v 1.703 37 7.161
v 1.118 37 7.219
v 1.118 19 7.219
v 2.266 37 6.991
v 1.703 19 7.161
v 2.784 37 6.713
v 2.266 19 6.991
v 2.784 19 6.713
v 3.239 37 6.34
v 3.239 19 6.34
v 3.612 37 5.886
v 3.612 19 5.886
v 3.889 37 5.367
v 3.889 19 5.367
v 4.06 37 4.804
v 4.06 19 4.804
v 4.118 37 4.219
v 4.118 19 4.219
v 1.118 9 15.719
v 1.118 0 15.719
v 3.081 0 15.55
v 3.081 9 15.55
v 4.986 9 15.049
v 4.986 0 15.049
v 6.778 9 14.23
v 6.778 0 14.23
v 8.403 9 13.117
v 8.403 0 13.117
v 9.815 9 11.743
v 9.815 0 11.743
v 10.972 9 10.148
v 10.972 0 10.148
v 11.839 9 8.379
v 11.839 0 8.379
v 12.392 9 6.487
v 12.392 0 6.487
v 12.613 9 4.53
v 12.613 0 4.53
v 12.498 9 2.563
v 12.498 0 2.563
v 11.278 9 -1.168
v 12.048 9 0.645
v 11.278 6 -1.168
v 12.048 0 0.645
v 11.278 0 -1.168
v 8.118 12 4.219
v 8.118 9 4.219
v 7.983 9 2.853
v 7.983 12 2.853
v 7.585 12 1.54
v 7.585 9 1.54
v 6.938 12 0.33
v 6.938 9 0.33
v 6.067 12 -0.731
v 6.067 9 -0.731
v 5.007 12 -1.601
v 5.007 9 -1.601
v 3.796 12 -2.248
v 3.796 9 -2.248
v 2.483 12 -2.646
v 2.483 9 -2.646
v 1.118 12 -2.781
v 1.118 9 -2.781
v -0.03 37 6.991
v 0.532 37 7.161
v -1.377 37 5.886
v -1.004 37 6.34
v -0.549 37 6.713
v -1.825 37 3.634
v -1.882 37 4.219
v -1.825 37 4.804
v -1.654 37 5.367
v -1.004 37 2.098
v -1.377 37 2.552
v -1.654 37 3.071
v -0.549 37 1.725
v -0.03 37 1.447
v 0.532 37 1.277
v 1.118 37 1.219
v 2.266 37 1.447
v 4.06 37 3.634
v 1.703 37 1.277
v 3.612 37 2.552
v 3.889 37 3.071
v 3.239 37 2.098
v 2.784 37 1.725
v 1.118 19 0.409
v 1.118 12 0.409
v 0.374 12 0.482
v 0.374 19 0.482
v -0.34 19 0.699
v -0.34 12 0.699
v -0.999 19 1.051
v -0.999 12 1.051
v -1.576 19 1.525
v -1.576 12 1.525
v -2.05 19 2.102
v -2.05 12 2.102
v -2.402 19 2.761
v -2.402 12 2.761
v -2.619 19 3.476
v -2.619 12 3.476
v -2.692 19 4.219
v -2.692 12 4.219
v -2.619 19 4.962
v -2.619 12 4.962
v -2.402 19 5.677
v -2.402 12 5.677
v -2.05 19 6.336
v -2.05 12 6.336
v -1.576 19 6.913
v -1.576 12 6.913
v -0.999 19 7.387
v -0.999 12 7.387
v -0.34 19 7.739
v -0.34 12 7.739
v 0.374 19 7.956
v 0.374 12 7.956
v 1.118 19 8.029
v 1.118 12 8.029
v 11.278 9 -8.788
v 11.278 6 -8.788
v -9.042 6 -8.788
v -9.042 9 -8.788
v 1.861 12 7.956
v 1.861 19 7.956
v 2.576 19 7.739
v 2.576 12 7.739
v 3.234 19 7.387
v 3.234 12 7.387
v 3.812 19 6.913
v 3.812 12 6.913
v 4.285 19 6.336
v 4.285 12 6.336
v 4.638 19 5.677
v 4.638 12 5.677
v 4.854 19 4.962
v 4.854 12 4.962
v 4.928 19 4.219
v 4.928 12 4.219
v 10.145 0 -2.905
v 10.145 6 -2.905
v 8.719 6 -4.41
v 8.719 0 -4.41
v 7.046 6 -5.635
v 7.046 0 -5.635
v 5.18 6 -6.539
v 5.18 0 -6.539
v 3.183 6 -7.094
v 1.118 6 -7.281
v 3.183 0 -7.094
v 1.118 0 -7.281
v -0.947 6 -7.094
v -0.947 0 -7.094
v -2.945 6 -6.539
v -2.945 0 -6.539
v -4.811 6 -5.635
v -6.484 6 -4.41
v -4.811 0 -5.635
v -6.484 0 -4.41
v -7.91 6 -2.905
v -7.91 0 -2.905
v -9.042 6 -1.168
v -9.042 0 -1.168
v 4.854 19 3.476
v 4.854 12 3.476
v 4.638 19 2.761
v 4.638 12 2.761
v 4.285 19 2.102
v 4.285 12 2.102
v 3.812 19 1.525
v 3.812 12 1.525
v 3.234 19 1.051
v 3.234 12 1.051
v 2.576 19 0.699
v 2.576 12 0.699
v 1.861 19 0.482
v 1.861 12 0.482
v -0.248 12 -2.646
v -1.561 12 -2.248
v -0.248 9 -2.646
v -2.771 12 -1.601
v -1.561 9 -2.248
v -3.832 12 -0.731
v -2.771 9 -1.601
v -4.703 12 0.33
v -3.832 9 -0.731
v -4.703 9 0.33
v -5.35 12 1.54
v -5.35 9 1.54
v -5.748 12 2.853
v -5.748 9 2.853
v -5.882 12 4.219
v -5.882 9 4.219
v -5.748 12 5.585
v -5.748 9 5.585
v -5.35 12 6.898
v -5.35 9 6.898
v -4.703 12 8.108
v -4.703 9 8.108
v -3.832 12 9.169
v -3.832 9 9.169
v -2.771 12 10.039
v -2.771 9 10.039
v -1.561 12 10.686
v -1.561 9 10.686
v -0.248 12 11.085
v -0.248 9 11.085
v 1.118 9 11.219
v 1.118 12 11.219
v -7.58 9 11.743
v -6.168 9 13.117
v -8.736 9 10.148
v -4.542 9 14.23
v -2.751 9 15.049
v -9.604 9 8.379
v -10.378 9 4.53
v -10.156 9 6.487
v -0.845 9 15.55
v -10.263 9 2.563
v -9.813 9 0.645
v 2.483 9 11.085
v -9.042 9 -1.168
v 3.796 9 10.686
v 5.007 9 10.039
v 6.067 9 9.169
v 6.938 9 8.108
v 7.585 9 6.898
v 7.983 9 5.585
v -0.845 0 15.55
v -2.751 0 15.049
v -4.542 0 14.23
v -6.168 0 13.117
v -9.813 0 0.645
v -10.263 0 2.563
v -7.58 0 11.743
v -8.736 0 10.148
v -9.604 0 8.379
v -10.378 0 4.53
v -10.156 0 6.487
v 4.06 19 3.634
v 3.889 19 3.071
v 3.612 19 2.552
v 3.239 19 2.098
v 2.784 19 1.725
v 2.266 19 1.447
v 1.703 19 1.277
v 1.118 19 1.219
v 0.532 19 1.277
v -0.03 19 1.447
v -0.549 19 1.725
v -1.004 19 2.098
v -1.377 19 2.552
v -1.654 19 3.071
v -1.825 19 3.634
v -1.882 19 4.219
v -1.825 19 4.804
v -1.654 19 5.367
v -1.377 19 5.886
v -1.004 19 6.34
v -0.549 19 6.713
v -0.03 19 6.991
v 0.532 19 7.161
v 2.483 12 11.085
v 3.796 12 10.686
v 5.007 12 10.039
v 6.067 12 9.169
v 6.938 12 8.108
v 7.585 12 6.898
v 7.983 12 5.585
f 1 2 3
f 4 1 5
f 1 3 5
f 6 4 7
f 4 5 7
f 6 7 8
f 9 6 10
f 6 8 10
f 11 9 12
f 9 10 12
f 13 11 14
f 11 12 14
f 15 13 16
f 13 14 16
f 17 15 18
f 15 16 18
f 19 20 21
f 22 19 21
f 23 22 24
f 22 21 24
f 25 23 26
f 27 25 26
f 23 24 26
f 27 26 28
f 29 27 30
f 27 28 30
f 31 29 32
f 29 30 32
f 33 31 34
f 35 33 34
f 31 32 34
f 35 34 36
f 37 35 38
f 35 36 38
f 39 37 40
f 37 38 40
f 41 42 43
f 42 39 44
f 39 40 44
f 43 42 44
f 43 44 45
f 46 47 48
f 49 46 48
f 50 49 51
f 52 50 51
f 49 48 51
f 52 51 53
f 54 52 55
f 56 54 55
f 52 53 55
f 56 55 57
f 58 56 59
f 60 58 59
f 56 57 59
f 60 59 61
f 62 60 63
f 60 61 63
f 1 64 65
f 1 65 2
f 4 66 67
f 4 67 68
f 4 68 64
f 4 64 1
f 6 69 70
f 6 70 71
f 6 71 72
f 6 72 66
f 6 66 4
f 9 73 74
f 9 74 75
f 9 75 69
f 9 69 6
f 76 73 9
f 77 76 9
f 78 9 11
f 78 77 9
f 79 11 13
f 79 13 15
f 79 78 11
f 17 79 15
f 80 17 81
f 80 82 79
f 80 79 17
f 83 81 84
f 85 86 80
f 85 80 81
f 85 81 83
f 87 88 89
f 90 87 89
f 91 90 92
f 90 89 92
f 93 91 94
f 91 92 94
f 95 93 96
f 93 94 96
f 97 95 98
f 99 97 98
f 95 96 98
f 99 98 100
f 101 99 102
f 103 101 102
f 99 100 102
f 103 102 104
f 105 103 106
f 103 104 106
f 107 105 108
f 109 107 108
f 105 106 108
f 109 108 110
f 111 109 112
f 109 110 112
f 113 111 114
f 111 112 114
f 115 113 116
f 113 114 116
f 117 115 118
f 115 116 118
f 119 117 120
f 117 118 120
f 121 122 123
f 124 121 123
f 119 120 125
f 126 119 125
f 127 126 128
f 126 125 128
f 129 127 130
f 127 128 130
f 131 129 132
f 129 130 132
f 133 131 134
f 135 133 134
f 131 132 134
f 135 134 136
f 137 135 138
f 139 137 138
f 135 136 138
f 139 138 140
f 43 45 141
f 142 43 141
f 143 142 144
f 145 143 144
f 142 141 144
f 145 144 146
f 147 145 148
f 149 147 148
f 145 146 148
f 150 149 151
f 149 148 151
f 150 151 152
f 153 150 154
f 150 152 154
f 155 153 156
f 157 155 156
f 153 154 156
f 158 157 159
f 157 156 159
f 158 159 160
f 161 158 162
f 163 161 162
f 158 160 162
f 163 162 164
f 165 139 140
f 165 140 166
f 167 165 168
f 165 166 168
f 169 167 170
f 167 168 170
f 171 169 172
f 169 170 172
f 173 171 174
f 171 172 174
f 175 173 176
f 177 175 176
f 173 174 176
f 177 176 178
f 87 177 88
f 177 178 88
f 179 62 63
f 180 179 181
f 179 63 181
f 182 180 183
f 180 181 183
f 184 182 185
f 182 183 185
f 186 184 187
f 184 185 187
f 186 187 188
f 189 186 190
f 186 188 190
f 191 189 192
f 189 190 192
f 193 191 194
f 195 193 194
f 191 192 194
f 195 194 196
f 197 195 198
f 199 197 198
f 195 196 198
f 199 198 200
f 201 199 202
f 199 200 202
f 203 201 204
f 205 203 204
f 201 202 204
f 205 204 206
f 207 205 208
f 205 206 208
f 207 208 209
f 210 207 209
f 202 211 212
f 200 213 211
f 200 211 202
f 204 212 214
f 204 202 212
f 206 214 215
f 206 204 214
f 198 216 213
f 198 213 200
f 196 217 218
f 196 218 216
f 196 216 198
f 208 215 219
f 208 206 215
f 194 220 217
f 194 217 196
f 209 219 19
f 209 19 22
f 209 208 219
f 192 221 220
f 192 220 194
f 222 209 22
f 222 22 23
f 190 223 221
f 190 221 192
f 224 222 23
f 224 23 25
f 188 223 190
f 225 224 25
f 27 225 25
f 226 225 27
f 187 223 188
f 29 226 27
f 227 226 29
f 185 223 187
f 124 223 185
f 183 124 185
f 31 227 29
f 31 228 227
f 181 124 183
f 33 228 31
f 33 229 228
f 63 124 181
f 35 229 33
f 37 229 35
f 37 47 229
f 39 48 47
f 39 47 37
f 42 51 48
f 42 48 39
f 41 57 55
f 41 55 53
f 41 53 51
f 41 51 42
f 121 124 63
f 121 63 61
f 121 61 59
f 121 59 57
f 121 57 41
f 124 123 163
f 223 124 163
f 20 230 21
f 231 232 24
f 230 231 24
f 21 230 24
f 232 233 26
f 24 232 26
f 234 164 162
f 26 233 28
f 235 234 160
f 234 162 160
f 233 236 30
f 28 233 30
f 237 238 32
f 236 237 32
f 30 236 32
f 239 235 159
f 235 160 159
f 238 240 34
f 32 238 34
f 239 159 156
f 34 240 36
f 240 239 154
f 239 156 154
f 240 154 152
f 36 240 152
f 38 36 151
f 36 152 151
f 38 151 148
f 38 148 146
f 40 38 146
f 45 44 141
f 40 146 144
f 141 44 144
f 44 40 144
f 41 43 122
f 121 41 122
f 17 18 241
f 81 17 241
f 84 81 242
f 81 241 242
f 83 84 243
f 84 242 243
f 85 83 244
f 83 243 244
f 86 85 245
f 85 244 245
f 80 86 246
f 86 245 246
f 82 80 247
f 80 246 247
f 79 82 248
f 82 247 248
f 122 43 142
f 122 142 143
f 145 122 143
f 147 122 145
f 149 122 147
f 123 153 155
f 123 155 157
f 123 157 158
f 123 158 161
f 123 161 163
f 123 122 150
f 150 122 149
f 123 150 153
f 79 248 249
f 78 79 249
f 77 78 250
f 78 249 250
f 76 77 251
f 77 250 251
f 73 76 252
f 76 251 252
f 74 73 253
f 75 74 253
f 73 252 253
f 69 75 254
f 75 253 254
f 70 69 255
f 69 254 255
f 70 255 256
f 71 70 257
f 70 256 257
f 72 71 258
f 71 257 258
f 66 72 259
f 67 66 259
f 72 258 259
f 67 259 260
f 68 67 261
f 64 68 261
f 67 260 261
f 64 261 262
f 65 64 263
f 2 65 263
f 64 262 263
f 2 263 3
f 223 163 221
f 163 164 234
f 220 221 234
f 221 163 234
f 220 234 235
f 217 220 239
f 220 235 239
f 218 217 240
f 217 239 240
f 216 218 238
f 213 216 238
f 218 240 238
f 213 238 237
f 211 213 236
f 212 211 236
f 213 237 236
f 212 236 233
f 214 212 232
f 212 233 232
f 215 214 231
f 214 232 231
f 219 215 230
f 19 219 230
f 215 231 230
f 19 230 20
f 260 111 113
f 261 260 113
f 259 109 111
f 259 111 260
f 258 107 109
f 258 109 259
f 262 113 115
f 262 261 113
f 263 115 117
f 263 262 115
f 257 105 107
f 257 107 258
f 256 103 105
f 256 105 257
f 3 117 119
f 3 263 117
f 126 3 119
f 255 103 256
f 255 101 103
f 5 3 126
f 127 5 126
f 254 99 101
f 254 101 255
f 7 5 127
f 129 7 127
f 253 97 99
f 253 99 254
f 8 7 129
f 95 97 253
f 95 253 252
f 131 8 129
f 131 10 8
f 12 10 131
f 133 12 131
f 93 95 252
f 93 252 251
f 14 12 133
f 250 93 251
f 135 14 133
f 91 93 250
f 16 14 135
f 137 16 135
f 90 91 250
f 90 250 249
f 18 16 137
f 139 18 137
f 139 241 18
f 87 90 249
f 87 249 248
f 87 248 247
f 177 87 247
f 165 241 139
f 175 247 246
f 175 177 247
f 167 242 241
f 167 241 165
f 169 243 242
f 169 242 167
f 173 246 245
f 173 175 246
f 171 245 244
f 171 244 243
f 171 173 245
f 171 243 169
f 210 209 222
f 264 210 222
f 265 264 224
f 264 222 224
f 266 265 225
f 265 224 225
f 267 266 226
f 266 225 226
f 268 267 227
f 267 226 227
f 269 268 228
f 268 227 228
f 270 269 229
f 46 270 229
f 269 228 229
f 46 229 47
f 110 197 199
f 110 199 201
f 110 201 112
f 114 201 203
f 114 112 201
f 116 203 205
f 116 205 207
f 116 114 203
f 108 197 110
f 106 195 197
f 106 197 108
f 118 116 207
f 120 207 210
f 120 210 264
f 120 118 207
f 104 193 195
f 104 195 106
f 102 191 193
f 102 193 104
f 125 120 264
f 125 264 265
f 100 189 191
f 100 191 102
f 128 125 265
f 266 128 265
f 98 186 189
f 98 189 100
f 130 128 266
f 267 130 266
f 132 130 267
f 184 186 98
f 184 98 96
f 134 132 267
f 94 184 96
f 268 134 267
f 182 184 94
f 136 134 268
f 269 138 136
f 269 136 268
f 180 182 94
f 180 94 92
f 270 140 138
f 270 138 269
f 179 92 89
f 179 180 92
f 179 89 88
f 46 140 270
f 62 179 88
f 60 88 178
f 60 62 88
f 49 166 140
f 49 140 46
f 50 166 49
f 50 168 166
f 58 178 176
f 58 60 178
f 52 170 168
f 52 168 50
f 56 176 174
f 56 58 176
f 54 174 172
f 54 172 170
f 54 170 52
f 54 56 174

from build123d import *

# Parameters (mm, degrees)
SKETCH1_R           = 7
BOSS_EXTRUDE1_DEPTH = 9
SKETCH1_3_R         = 7
SKETCH1_3_R_2       = 3.81
BOSS_EXTRUDE2_DEPTH = 12
SKETCH1_4_R         = 3.81
SKETCH1_4_R_2       = 3
BOSS_EXTRUDE3_DEPTH = 19
SKETCH1_5_R         = 3
BOSS_EXTRUDE4_DEPTH = 37
CUT_EXTRUDE1_DEPTH  = 6


with BuildPart() as part:
    # Sketch1 → Boss-Extrude1 (new body)
    with BuildSketch(Plane(origin=(0, 0, 0), x_dir=(1, 0, 0), z_dir=(0, 1, 0))):
        with BuildLine():
            Line((11.2776, 8.7884), (-9.0424, 8.7884))
            Line((-9.0424, 8.7884), (-9.0424, 1.1684))
            ThreePointArc((-9.0424, 1.1684), (1.1176, -15.719029814), (11.2776, 1.1684))
            Line((11.2776, 1.1684), (11.2776, 8.7884))
        make_face()
        with Locations((1.1176, -4.219029814)):
            Circle(SKETCH1_R, mode=Mode.SUBTRACT)
    extrude(amount=BOSS_EXTRUDE1_DEPTH)

    # Sketch1<3> → Boss-Extrude2 (add)
    with BuildSketch(Plane(origin=(0, 0, 0), x_dir=(1, 0, 0), z_dir=(0, 1, 0))):
        with Locations((1.1176, -4.219029814)):
            Circle(SKETCH1_3_R)
        with Locations((1.1176, -4.219029814)):
            Circle(SKETCH1_3_R_2, mode=Mode.SUBTRACT)
    extrude(amount=BOSS_EXTRUDE2_DEPTH)

    # Sketch1<4> → Boss-Extrude3 (add)
    with BuildSketch(Plane(origin=(0, 0, 0), x_dir=(1, 0, 0), z_dir=(0, 1, 0))):
        with Locations((1.1176, -4.219029814)):
            Circle(SKETCH1_4_R)
        with Locations((1.1176, -4.219029814)):
            Circle(SKETCH1_4_R_2, mode=Mode.SUBTRACT)
    extrude(amount=BOSS_EXTRUDE3_DEPTH)

    # Sketch1<5> → Boss-Extrude4 (add)
    with BuildSketch(Plane(origin=(0, 0, 0), x_dir=(1, 0, 0), z_dir=(0, 1, 0))):
        with Locations((1.1176, -4.219029814)):
            Circle(SKETCH1_5_R)
    extrude(amount=BOSS_EXTRUDE4_DEPTH)

    # Sketch2 → Cut-Extrude1 (cut)
    with BuildSketch(Plane(origin=(0, 0, 0), x_dir=(-1, 0, 0), z_dir=(0, -1, 0))):
        with BuildLine():
            Line((9.0424, 1.1684), (9.0424, 8.7884))
            Line((9.0424, 8.7884), (-11.2776, 8.7884))
            Line((-11.2776, 8.7884), (-11.2776, 1.1684))
            ThreePointArc((-11.2776, 1.1684), (-1.1176, 7.280970186), (9.0424, 1.1684))
        make_face()
    extrude(amount=-CUT_EXTRUDE1_DEPTH, mode=Mode.SUBTRACT)


solid = part.part
